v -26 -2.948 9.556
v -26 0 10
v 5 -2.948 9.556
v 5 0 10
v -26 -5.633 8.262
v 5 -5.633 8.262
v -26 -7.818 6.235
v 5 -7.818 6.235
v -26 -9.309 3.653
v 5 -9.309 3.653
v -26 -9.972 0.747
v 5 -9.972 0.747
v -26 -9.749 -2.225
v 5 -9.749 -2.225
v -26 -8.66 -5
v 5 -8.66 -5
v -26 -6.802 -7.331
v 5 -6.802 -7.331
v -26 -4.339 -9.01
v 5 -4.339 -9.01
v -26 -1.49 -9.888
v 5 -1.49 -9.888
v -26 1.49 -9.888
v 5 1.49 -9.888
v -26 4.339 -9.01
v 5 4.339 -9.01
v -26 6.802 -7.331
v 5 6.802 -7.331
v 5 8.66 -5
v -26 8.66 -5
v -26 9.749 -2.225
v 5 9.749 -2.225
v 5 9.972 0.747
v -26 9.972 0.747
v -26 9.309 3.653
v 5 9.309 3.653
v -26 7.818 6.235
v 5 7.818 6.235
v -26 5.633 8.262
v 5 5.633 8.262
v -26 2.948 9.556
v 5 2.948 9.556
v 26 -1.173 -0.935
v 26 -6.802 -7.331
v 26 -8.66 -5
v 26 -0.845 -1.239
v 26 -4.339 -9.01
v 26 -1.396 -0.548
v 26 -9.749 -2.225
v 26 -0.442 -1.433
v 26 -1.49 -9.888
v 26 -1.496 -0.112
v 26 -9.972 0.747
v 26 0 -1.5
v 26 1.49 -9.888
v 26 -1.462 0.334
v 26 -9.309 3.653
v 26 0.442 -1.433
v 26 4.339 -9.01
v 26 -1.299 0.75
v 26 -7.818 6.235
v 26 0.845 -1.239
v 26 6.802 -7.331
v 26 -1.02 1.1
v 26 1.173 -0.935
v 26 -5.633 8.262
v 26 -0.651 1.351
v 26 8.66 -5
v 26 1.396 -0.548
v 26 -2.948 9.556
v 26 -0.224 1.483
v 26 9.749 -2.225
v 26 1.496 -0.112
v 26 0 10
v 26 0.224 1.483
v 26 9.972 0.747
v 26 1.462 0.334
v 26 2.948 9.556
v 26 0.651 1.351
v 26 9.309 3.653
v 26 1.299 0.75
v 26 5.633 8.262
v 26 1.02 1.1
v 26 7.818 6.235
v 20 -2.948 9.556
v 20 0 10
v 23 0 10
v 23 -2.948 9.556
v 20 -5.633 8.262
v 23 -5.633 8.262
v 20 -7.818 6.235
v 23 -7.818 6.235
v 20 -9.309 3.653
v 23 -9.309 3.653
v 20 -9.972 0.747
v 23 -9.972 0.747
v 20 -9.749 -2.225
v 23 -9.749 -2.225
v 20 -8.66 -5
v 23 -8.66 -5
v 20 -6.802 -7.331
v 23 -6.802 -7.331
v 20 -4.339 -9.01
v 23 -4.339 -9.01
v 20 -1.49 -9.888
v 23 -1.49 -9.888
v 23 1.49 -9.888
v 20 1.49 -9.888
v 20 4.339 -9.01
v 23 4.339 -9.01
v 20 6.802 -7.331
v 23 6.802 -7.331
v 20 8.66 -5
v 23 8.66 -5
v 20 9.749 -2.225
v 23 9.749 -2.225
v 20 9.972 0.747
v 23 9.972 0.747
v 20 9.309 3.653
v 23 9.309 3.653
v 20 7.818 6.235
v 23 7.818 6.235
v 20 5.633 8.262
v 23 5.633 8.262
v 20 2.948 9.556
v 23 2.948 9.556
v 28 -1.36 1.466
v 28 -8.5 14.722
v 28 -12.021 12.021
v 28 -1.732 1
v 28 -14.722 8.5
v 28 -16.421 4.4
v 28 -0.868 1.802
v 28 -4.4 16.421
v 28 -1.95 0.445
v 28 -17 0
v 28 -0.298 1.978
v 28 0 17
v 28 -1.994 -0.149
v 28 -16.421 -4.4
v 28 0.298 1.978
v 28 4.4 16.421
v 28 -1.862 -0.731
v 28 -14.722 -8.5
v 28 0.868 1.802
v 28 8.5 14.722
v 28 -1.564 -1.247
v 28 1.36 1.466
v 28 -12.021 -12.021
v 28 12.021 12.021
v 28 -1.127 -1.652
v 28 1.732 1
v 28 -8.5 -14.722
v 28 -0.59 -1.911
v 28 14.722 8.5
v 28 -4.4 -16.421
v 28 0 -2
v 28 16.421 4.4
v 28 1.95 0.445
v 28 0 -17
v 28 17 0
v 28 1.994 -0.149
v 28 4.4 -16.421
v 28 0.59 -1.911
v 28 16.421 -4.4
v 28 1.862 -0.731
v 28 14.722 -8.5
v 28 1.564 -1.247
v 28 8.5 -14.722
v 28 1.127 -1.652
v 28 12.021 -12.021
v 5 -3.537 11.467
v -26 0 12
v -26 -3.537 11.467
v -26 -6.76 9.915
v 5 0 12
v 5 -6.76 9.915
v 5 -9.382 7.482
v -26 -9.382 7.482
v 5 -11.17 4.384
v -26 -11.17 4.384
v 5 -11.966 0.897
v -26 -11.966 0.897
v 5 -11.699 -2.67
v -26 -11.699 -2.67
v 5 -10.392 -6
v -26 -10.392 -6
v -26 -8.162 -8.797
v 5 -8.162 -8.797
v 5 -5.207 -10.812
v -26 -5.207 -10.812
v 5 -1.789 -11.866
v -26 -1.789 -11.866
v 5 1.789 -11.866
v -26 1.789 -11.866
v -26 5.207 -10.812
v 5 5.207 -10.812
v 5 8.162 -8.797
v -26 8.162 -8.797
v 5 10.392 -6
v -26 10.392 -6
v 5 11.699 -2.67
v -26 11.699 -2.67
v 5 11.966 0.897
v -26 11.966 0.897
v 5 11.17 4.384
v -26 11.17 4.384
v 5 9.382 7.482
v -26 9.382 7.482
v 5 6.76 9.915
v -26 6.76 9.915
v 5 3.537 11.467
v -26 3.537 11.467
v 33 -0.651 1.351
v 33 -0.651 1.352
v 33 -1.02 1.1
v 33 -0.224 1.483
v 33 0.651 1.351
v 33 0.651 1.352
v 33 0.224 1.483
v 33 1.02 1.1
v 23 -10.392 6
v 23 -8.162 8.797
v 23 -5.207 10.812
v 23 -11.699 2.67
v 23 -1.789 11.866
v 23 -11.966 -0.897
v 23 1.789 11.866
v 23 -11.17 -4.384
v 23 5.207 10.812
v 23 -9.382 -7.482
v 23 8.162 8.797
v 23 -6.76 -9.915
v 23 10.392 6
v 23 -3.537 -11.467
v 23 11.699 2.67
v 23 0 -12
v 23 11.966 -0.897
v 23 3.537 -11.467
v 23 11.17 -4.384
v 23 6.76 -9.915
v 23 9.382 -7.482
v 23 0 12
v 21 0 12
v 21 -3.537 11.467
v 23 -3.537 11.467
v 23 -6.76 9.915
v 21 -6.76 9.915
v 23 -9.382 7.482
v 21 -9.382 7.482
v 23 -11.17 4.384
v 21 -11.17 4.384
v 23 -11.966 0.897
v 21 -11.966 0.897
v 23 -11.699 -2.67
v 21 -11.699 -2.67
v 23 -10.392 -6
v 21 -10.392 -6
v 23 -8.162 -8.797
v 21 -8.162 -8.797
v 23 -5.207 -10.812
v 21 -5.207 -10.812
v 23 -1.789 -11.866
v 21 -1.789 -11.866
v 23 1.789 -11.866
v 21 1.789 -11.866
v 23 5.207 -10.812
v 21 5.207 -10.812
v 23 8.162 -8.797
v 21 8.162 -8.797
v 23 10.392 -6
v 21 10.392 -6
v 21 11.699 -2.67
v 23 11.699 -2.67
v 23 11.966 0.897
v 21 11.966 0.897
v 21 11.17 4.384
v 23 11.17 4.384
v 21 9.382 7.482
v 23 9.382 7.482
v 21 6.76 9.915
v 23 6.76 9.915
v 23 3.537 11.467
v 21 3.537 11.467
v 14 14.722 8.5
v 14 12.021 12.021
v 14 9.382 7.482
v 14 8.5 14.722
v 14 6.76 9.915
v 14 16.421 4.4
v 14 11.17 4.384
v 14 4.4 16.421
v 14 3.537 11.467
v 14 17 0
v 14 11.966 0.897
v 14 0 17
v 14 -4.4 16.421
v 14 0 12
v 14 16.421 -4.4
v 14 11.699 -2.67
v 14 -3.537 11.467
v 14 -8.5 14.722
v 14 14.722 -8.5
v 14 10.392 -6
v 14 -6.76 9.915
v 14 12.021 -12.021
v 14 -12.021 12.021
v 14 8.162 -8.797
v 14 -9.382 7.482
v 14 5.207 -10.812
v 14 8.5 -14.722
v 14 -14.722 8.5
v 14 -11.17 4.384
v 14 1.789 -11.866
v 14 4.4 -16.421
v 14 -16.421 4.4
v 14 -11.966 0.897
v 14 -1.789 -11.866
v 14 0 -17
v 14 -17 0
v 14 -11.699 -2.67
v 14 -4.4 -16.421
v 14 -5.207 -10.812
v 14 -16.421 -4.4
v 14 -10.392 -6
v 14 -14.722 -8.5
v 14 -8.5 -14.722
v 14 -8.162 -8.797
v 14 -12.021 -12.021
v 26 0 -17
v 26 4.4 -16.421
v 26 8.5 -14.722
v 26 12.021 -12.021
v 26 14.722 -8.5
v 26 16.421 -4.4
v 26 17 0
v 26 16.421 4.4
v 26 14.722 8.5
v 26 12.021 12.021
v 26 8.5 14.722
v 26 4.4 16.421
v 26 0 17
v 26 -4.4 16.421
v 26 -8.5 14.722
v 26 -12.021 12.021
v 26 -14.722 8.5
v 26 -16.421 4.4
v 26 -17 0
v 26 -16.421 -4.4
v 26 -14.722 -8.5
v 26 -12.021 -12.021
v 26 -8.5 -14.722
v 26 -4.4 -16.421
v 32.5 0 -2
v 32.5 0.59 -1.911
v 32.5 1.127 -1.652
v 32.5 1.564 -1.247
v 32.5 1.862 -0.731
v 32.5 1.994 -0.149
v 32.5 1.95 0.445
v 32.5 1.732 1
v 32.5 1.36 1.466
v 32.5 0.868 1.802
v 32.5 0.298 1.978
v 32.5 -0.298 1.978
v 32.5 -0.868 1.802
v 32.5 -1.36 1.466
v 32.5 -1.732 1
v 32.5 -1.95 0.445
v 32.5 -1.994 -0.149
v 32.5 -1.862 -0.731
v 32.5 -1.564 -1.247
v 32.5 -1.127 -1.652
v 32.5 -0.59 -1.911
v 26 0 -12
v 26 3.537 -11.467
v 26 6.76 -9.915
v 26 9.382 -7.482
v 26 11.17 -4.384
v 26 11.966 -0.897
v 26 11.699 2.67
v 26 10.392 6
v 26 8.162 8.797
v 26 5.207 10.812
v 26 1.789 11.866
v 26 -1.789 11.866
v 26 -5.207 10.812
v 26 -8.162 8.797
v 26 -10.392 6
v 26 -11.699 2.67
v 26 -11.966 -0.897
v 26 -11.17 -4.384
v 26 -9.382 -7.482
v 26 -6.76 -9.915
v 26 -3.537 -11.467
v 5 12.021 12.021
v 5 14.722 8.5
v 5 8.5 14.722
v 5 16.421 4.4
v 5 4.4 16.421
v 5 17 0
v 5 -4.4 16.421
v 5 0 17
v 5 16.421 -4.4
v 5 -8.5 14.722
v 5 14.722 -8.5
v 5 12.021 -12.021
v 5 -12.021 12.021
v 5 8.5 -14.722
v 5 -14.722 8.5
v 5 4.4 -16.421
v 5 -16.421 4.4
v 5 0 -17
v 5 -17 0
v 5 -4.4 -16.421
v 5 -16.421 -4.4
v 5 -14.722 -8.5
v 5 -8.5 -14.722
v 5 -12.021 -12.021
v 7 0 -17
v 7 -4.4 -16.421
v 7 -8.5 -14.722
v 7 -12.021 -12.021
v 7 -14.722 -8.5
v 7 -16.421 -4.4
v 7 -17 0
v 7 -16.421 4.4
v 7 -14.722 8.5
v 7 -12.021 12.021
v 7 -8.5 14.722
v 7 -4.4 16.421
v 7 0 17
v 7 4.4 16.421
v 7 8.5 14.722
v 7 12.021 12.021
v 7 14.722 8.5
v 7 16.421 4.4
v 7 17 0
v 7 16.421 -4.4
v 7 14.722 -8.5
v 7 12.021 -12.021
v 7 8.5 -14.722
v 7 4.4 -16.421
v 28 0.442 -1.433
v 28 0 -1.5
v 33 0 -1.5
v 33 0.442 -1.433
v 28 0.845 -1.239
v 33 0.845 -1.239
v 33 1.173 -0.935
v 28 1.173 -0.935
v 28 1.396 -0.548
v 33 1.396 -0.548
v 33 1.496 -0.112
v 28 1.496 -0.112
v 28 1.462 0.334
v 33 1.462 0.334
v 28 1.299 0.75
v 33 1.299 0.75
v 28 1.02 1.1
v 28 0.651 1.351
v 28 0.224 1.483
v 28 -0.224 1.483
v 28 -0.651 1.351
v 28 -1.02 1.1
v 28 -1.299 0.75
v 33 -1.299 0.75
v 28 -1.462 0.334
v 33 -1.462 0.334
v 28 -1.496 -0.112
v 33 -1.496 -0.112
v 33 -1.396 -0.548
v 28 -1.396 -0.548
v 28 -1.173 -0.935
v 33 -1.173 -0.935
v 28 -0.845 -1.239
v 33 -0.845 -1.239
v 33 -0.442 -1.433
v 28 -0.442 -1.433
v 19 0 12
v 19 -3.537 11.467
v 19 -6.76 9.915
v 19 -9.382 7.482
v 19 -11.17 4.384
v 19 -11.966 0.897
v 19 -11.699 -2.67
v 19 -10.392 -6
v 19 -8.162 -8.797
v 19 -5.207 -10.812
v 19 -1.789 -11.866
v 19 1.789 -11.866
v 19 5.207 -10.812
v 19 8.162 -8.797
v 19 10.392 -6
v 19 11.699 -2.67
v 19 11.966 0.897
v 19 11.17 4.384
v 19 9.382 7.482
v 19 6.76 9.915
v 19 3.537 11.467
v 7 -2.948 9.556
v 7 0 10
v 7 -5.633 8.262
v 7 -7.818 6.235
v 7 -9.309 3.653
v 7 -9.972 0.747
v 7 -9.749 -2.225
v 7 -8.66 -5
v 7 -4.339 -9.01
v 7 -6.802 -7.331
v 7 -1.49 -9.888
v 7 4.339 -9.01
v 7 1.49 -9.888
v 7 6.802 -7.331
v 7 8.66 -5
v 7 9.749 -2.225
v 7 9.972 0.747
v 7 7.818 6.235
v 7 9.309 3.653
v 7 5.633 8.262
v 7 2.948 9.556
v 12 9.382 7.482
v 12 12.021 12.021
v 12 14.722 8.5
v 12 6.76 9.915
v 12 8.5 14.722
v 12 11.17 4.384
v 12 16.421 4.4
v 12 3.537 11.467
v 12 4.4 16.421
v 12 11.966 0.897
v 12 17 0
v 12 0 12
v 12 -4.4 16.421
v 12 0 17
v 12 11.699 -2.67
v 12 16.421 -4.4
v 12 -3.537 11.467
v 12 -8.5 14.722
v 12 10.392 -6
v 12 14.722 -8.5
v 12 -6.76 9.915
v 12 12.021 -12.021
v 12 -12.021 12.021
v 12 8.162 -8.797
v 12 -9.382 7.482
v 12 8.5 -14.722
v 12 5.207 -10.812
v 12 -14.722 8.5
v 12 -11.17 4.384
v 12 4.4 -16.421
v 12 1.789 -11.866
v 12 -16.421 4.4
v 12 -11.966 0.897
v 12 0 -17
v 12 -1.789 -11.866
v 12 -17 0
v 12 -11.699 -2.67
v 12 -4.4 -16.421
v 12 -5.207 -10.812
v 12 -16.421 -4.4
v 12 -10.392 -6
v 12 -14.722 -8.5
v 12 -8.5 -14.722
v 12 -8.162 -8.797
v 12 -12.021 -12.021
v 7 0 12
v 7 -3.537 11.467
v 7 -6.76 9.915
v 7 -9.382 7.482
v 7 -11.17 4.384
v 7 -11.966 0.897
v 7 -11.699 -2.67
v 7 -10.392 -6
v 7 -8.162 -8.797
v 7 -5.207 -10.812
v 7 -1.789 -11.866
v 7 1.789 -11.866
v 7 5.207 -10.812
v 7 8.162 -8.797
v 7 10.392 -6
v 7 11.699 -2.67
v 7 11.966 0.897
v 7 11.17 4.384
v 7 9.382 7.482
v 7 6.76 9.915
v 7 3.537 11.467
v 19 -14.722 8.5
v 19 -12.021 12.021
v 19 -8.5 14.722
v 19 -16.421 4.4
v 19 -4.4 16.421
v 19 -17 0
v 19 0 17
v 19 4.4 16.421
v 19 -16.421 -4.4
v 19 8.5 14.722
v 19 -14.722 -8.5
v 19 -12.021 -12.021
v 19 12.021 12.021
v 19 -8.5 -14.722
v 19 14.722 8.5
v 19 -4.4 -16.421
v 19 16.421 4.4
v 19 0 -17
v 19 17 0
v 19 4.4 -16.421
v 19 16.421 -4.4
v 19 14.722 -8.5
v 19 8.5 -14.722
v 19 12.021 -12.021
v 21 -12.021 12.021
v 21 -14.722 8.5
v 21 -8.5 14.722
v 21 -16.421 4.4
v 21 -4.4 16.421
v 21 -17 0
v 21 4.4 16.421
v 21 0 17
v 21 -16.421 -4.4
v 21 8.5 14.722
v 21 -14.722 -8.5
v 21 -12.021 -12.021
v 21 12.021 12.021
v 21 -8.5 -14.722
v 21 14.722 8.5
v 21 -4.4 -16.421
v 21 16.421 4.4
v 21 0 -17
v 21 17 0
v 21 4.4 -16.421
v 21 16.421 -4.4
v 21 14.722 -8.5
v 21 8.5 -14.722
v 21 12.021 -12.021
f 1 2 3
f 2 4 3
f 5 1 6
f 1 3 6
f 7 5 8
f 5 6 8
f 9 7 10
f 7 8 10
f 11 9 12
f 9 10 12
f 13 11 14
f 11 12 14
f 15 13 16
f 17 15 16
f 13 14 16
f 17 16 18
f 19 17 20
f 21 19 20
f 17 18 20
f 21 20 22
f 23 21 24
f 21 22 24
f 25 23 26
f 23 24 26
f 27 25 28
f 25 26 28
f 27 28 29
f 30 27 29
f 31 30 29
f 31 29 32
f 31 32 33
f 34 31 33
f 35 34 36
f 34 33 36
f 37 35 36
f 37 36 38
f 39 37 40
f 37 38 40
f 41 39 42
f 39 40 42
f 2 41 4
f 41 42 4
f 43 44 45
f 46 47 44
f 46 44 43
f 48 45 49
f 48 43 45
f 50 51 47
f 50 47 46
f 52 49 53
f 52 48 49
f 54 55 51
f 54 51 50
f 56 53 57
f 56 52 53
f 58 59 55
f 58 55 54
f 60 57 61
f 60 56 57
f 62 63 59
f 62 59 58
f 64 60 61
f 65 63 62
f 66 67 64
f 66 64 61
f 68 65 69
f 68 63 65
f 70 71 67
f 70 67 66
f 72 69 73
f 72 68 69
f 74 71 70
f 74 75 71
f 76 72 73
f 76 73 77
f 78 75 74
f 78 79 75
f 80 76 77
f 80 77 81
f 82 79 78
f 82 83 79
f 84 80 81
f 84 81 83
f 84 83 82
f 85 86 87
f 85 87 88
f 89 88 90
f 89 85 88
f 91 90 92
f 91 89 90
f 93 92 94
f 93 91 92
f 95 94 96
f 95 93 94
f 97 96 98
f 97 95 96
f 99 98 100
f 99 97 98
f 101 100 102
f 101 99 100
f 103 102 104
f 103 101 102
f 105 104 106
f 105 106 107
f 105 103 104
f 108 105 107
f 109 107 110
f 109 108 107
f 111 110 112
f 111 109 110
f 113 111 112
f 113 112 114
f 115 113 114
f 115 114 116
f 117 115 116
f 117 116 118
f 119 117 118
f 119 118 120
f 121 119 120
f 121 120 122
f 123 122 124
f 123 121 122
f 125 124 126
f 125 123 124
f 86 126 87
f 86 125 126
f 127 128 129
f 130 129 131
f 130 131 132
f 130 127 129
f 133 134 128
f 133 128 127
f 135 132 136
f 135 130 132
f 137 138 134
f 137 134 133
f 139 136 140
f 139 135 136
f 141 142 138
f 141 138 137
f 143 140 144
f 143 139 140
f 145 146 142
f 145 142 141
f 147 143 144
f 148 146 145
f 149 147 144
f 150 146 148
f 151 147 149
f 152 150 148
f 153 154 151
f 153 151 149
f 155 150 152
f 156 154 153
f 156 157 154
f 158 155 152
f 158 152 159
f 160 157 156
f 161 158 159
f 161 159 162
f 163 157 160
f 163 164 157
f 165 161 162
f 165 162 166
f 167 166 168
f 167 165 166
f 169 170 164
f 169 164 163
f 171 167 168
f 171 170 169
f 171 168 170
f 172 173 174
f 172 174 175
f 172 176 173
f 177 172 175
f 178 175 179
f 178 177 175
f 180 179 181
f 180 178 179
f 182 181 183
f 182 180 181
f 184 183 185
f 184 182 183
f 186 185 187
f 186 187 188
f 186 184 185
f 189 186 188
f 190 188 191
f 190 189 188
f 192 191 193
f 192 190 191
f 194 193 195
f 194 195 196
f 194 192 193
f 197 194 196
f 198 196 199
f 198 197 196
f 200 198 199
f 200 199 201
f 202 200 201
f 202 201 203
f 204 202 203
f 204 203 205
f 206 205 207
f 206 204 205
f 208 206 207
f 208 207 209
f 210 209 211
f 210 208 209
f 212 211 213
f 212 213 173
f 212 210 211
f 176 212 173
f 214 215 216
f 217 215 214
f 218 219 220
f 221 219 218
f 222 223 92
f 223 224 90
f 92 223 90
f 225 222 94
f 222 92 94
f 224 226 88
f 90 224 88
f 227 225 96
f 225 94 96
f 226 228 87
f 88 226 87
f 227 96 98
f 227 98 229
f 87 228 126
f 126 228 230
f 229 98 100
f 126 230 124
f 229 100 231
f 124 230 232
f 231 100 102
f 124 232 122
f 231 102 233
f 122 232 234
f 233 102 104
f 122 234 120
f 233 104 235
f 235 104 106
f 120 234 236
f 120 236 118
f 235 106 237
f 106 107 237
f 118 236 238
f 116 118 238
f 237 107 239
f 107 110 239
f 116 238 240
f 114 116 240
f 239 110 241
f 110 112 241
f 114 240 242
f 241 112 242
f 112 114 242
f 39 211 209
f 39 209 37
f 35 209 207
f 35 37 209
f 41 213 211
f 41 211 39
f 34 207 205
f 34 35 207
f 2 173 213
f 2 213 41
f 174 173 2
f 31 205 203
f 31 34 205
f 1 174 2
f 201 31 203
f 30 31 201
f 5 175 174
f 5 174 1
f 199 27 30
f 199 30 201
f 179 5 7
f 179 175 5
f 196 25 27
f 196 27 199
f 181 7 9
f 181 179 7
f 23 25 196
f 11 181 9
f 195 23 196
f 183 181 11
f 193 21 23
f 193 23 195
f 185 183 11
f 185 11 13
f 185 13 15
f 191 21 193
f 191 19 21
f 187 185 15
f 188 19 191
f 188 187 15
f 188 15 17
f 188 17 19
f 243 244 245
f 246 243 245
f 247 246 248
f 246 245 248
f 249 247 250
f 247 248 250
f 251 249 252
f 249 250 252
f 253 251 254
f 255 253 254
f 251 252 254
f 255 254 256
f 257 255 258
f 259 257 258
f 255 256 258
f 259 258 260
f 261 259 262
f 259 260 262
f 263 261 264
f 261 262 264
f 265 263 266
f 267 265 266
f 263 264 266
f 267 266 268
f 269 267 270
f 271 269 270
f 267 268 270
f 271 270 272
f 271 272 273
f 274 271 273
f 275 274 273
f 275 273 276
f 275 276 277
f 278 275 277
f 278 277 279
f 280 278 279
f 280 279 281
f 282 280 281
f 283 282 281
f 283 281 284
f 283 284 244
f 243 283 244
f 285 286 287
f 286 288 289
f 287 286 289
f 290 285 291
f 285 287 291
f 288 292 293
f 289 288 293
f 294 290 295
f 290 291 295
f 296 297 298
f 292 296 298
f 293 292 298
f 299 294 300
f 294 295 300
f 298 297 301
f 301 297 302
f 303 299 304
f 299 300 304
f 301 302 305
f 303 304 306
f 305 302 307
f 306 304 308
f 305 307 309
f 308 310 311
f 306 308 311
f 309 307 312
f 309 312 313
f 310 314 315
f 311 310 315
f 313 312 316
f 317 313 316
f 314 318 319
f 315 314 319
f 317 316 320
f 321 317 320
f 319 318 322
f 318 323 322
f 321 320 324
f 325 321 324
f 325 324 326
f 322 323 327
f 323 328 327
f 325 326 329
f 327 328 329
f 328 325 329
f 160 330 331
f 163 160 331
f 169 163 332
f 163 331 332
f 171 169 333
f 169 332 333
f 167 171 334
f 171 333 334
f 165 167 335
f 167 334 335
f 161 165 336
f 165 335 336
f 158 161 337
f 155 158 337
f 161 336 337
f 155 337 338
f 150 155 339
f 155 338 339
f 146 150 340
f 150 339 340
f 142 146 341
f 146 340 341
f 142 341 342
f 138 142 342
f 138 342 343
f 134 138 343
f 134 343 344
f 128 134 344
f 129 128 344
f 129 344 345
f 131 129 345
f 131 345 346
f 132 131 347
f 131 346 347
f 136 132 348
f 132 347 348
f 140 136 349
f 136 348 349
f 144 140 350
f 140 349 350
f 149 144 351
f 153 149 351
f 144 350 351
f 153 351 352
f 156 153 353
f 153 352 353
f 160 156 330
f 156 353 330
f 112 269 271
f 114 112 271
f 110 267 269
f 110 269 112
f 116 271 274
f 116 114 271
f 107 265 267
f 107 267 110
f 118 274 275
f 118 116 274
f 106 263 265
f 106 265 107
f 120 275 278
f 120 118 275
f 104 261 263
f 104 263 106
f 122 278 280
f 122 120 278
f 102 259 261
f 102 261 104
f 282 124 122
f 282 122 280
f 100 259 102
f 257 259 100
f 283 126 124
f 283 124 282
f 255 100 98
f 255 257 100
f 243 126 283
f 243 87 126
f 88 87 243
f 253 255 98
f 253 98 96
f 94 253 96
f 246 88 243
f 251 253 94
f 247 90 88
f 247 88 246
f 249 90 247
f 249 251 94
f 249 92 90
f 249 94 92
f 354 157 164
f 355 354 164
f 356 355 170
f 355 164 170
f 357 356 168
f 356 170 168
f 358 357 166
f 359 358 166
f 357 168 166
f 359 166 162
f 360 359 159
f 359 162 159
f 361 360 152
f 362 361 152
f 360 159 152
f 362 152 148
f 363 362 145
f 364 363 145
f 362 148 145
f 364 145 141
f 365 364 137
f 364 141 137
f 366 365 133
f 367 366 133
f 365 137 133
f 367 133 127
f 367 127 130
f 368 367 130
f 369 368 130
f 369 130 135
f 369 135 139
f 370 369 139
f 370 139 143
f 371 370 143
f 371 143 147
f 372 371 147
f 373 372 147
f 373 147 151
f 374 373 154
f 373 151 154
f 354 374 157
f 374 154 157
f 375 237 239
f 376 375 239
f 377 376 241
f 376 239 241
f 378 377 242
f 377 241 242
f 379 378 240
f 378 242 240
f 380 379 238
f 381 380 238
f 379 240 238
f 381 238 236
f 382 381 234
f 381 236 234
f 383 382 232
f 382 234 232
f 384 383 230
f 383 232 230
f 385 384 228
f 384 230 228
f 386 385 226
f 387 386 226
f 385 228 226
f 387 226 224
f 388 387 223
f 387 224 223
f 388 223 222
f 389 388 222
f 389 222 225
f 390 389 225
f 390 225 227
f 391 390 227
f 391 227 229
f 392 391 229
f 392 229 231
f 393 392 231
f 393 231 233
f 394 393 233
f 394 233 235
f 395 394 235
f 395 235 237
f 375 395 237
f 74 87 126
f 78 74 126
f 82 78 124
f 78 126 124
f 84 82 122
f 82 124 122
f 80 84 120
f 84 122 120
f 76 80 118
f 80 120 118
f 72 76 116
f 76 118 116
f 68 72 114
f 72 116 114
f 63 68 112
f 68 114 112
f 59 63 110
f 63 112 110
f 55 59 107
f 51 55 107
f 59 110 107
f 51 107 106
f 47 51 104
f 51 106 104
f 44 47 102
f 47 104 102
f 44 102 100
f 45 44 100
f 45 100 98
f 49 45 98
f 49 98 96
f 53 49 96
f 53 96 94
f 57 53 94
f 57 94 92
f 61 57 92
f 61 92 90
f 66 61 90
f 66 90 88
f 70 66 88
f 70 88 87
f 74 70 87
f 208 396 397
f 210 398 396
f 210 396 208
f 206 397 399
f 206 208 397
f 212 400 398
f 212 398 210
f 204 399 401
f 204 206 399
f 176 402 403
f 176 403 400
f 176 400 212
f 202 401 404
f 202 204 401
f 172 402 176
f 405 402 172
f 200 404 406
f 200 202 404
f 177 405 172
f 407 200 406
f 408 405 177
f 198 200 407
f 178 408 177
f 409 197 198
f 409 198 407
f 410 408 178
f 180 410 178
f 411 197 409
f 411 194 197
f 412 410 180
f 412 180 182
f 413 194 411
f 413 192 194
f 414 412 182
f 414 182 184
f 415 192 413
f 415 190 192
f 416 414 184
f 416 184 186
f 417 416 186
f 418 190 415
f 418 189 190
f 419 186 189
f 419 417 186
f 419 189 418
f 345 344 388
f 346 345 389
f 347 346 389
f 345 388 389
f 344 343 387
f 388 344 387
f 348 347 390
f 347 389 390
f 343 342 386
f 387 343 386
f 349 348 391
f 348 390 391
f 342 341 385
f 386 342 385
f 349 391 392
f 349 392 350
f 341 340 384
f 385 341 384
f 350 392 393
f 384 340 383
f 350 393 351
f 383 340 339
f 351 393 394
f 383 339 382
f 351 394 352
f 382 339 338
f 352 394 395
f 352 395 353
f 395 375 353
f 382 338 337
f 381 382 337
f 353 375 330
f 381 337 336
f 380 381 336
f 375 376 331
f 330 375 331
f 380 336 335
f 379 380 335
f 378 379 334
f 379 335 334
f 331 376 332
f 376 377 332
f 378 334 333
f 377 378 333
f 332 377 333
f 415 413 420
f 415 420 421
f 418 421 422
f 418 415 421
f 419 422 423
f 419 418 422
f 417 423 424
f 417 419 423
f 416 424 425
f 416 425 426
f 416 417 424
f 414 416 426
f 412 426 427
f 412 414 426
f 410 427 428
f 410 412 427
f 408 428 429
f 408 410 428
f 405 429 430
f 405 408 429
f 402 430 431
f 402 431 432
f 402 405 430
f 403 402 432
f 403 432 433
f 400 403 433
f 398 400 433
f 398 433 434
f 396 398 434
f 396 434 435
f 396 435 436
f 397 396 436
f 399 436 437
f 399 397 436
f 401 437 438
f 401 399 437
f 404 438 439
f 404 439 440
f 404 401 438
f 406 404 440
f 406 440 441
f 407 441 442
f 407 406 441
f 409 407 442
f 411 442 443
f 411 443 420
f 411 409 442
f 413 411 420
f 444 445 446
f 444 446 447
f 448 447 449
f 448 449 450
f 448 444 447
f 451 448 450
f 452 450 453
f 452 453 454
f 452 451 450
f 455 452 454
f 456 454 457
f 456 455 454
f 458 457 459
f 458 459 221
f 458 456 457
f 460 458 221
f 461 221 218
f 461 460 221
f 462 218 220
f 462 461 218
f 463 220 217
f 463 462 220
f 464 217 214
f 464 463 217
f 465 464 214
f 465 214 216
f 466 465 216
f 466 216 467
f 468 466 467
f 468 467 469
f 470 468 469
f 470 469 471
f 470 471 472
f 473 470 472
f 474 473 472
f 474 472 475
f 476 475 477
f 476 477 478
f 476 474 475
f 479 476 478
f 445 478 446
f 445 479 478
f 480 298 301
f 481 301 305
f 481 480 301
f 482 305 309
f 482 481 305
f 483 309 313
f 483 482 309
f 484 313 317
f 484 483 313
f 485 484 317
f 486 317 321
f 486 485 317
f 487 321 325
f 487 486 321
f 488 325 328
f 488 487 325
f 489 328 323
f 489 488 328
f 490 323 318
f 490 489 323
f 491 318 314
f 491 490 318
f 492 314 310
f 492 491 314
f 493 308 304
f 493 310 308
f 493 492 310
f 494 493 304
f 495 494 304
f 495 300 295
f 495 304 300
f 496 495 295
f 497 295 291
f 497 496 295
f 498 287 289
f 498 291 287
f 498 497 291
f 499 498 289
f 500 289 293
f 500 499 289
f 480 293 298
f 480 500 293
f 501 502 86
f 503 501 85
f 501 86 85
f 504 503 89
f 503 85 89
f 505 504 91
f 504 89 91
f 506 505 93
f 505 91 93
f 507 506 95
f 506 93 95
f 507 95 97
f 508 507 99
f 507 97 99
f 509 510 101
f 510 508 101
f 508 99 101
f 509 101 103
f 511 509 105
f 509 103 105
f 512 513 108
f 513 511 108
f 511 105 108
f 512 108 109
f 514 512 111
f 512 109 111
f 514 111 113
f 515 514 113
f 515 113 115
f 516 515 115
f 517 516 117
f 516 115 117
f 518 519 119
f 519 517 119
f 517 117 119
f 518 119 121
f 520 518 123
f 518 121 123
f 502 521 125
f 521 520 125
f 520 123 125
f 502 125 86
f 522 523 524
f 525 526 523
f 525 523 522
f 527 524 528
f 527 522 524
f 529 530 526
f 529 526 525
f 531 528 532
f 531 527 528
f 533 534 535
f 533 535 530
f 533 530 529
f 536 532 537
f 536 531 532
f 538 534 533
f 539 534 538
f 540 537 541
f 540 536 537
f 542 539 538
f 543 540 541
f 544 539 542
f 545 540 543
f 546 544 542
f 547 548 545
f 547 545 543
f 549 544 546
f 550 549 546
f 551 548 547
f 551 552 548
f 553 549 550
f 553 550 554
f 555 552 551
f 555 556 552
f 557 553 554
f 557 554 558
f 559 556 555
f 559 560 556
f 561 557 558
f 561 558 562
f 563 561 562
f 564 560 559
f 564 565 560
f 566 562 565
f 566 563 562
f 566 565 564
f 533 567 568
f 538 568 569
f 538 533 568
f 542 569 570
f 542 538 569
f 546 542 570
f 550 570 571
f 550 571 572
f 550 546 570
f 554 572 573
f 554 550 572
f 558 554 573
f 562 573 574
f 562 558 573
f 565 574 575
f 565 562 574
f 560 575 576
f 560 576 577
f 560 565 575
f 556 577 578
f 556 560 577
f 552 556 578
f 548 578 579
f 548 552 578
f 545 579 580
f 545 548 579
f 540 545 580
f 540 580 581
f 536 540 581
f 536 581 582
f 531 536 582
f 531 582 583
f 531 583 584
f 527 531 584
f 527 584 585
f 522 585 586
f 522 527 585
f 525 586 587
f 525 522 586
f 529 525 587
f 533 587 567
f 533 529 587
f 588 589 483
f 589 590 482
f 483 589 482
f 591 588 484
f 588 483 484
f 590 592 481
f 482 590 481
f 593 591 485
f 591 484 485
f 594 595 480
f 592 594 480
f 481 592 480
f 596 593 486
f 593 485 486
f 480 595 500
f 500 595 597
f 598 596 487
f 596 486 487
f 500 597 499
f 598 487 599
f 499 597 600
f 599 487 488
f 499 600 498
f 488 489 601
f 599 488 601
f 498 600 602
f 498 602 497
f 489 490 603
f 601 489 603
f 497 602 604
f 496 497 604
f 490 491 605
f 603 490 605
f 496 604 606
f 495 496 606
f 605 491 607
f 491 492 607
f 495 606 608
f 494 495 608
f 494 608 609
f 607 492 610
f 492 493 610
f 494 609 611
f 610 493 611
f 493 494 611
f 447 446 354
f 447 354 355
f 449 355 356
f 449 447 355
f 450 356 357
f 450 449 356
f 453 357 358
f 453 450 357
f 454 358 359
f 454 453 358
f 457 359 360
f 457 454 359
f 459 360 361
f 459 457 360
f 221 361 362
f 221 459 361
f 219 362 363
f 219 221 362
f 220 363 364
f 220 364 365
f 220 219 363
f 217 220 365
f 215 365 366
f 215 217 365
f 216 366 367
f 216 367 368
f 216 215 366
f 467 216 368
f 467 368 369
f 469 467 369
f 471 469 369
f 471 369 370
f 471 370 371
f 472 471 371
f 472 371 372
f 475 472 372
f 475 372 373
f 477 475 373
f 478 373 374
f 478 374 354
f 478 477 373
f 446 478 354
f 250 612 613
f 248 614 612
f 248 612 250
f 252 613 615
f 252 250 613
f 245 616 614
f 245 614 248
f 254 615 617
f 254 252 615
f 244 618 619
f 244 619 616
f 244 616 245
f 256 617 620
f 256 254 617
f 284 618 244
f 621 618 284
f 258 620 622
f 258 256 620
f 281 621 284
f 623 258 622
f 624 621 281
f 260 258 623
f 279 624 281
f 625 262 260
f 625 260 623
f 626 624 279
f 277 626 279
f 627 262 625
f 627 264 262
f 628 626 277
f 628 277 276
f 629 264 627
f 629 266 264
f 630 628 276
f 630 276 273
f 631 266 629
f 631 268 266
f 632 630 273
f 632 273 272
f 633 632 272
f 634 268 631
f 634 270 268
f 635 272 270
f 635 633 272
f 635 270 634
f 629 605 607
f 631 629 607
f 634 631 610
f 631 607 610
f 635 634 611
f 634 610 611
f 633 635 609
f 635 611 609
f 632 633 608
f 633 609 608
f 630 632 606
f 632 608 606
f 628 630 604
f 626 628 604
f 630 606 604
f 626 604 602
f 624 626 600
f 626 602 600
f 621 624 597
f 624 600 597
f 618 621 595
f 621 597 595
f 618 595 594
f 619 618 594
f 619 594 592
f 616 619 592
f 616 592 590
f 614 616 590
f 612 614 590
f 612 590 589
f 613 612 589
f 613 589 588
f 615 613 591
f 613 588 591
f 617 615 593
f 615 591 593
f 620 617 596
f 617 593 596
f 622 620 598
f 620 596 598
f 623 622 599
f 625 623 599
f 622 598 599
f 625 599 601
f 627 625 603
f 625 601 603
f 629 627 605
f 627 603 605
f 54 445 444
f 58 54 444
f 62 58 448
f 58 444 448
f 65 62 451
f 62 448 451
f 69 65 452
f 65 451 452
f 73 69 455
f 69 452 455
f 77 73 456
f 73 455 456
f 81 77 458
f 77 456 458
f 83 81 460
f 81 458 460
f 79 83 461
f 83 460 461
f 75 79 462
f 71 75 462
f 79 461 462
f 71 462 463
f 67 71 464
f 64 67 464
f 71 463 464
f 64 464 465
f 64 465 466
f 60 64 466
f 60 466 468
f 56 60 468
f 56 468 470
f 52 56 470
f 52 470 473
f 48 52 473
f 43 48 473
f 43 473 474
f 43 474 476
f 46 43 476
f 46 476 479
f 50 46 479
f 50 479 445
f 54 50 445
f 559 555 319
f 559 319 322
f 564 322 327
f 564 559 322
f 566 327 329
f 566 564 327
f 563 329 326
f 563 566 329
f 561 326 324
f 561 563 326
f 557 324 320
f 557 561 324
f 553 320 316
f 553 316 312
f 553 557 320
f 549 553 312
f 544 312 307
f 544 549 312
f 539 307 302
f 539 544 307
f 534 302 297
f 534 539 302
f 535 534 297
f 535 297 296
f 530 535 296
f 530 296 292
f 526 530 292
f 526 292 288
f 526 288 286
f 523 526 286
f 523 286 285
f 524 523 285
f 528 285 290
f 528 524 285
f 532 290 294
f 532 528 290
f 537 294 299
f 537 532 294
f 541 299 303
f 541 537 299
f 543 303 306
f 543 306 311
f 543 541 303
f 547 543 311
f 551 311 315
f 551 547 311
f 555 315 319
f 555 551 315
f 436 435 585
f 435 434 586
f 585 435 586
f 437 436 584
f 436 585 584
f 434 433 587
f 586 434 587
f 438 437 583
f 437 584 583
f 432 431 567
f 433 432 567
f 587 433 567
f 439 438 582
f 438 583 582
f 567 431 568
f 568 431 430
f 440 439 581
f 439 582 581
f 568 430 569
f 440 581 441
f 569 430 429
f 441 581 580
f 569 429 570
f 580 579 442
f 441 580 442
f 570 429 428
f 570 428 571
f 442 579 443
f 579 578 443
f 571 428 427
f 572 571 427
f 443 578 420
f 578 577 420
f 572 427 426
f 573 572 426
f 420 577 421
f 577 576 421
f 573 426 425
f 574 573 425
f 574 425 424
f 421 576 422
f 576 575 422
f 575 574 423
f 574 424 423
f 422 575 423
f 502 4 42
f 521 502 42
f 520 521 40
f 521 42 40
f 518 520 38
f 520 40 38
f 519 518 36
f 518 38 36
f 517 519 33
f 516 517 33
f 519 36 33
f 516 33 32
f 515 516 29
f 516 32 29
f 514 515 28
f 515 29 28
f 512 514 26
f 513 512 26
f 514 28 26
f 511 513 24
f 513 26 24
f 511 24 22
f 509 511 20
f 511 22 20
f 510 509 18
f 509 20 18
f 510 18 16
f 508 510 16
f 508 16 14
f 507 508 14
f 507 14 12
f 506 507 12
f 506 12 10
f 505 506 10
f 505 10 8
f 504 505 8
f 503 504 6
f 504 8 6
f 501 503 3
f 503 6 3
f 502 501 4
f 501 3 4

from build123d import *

# Parameters (mm, degrees)
SKETCH_1_W          = 46
SKETCH_1_H          = 2
SKETCH_8_R          = 12
SKETCH_8_R_2        = 10
EXTRUDE_3_DEPTH     = 3
SKETCH_9_R          = 12
EXTRUDE_5_DEPTH     = 5
SKETCH_11_R         = 10
CUT_EXTRUDE_7_DEPTH = 52
SKETCH_12_R         = 1.5
CUT_EXTRUDE_8_DEPTH = 57.603886792
EXTRUDE_START       = -2
SKETCH_14_R         = 17
SKETCH_14_R_2       = 12
EXTRUDE_6_DEPTH     = 2
EXTRUDE_START_2     = -9
SKETCH_15_R         = 17
SKETCH_15_R_2       = 12
EXTRUDE_7_DEPTH     = 2
EXTRUDE_START_3     = 7
SKETCH_20_R         = 17
SKETCH_20_R_2       = 12
EXTRUDE_11_DEPTH    = 2
SKETCH_21_R         = 17
SKETCH_21_R_2       = 10
EXTRUDE_12_DEPTH    = 2
SKETCH_22_R         = 2
SKETCH_22_R_2       = 1.5
EXTRUDE_13_DEPTH    = 5
CHAMFER_1_SIZE      = 0.5


with BuildPart() as part:
    # 草图1 → 旋转1 (revolve)
    with BuildSketch(Plane.XY, mode=Mode.PRIVATE) as revolve_1_sk:
        with Locations((-3, 11)):
            Rectangle(SKETCH_1_W, SKETCH_1_H)
    revolve(revolve_1_sk.sketch.rotate(Axis((-26, 0, 0), (1, 0, 0)), 90), axis=Axis((-26, 0, 0), (1, 0, 0)))

    # 草图8 → 凸台-拉伸3 (add)
    with BuildSketch(Plane(origin=(20, 0, 0), x_dir=(0, 0, -1), z_dir=(1, 0, 0))):
        with Locations(Location((0, 0, 0), (0, 0, 180))):
            Circle(SKETCH_8_R)
        with Locations(Location((0, 0, 0), (0, 0, 180))):
            Circle(SKETCH_8_R_2, mode=Mode.SUBTRACT)
    extrude(amount=EXTRUDE_3_DEPTH)

    # 草图15 → 凸台-拉伸7 (add)
    with BuildSketch(Plane(origin=(28, 0, 0), x_dir=(0, 0, -1), z_dir=(1, 0, 0)).offset(EXTRUDE_START_2)):
        Circle(SKETCH_15_R)
        Circle(SKETCH_15_R_2, mode=Mode.SUBTRACT)
    extrude(amount=EXTRUDE_7_DEPTH)

    # 草图20 → 凸台-拉伸11 (add)
    with BuildSketch(Plane.ZY.offset(-19).offset(EXTRUDE_START_3)):
        with Locations(Location((0, 0, 0), (0, 0, 180))):
            Circle(SKETCH_20_R)
        with Locations(Location((0, 0, 0), (0, 0, 180))):
            Circle(SKETCH_20_R_2, mode=Mode.SUBTRACT)
    extrude(amount=-EXTRUDE_11_DEPTH)

    # 草图21 → 凸台-拉伸12 (add)
    with BuildSketch(Plane.ZY.offset(-12).offset(EXTRUDE_START_3)):
        with Locations(Location((0, 0, 0), (0, 0, 180))):
            Circle(SKETCH_21_R)
        Circle(SKETCH_21_R_2, mode=Mode.SUBTRACT)
    extrude(amount=-EXTRUDE_12_DEPTH)


with BuildPart() as body_2:
    # 草图9 → 凸台-拉伸5 (new body)
    with BuildSketch(Plane(origin=(23, 0, 0), x_dir=(0, 0, -1), z_dir=(1, 0, 0))):
        Circle(SKETCH_9_R)
    extrude(amount=EXTRUDE_5_DEPTH)

    # 草图11 → 切除-拉伸7 (cut)
    with BuildSketch(Plane.ZY.offset(26)):
        Circle(SKETCH_11_R)
    extrude(amount=-CUT_EXTRUDE_7_DEPTH, mode=Mode.SUBTRACT)

    # 草图12 → 切除-拉伸8 (cut, through all)
    with BuildSketch(Plane(origin=(28, 0, 0), x_dir=(0, 0, -1), z_dir=(1, 0, 0))):
        Circle(SKETCH_12_R)
    extrude(amount=-CUT_EXTRUDE_8_DEPTH, mode=Mode.SUBTRACT)

    # 草图14 → 凸台-拉伸6 (add)
    with BuildSketch(Plane(origin=(28, 0, 0), x_dir=(0, 0, -1), z_dir=(1, 0, 0)).offset(EXTRUDE_START)):
        Circle(SKETCH_14_R)
        Circle(SKETCH_14_R_2, mode=Mode.SUBTRACT)
    extrude(amount=EXTRUDE_6_DEPTH)

    # 草图22 → 凸台-拉伸13 (add)
    with BuildSketch(Plane(origin=(28, 0, 0), x_dir=(0, 0, -1), z_dir=(1, 0, 0))):
        Circle(SKETCH_22_R)
        Circle(SKETCH_22_R_2, mode=Mode.SUBTRACT)
    extrude(amount=EXTRUDE_13_DEPTH)

    # 倒角1
    chamfer_1_edges = [body_2.edges().sort_by_distance(p)[0] for p in [
        (33, 0, 2),
    ]]
    chamfer(chamfer_1_edges, length=CHAMFER_1_SIZE - 0.0001)  # a hair under: the kernel refuses the full size


solid = Compound([part.part, body_2.part])
